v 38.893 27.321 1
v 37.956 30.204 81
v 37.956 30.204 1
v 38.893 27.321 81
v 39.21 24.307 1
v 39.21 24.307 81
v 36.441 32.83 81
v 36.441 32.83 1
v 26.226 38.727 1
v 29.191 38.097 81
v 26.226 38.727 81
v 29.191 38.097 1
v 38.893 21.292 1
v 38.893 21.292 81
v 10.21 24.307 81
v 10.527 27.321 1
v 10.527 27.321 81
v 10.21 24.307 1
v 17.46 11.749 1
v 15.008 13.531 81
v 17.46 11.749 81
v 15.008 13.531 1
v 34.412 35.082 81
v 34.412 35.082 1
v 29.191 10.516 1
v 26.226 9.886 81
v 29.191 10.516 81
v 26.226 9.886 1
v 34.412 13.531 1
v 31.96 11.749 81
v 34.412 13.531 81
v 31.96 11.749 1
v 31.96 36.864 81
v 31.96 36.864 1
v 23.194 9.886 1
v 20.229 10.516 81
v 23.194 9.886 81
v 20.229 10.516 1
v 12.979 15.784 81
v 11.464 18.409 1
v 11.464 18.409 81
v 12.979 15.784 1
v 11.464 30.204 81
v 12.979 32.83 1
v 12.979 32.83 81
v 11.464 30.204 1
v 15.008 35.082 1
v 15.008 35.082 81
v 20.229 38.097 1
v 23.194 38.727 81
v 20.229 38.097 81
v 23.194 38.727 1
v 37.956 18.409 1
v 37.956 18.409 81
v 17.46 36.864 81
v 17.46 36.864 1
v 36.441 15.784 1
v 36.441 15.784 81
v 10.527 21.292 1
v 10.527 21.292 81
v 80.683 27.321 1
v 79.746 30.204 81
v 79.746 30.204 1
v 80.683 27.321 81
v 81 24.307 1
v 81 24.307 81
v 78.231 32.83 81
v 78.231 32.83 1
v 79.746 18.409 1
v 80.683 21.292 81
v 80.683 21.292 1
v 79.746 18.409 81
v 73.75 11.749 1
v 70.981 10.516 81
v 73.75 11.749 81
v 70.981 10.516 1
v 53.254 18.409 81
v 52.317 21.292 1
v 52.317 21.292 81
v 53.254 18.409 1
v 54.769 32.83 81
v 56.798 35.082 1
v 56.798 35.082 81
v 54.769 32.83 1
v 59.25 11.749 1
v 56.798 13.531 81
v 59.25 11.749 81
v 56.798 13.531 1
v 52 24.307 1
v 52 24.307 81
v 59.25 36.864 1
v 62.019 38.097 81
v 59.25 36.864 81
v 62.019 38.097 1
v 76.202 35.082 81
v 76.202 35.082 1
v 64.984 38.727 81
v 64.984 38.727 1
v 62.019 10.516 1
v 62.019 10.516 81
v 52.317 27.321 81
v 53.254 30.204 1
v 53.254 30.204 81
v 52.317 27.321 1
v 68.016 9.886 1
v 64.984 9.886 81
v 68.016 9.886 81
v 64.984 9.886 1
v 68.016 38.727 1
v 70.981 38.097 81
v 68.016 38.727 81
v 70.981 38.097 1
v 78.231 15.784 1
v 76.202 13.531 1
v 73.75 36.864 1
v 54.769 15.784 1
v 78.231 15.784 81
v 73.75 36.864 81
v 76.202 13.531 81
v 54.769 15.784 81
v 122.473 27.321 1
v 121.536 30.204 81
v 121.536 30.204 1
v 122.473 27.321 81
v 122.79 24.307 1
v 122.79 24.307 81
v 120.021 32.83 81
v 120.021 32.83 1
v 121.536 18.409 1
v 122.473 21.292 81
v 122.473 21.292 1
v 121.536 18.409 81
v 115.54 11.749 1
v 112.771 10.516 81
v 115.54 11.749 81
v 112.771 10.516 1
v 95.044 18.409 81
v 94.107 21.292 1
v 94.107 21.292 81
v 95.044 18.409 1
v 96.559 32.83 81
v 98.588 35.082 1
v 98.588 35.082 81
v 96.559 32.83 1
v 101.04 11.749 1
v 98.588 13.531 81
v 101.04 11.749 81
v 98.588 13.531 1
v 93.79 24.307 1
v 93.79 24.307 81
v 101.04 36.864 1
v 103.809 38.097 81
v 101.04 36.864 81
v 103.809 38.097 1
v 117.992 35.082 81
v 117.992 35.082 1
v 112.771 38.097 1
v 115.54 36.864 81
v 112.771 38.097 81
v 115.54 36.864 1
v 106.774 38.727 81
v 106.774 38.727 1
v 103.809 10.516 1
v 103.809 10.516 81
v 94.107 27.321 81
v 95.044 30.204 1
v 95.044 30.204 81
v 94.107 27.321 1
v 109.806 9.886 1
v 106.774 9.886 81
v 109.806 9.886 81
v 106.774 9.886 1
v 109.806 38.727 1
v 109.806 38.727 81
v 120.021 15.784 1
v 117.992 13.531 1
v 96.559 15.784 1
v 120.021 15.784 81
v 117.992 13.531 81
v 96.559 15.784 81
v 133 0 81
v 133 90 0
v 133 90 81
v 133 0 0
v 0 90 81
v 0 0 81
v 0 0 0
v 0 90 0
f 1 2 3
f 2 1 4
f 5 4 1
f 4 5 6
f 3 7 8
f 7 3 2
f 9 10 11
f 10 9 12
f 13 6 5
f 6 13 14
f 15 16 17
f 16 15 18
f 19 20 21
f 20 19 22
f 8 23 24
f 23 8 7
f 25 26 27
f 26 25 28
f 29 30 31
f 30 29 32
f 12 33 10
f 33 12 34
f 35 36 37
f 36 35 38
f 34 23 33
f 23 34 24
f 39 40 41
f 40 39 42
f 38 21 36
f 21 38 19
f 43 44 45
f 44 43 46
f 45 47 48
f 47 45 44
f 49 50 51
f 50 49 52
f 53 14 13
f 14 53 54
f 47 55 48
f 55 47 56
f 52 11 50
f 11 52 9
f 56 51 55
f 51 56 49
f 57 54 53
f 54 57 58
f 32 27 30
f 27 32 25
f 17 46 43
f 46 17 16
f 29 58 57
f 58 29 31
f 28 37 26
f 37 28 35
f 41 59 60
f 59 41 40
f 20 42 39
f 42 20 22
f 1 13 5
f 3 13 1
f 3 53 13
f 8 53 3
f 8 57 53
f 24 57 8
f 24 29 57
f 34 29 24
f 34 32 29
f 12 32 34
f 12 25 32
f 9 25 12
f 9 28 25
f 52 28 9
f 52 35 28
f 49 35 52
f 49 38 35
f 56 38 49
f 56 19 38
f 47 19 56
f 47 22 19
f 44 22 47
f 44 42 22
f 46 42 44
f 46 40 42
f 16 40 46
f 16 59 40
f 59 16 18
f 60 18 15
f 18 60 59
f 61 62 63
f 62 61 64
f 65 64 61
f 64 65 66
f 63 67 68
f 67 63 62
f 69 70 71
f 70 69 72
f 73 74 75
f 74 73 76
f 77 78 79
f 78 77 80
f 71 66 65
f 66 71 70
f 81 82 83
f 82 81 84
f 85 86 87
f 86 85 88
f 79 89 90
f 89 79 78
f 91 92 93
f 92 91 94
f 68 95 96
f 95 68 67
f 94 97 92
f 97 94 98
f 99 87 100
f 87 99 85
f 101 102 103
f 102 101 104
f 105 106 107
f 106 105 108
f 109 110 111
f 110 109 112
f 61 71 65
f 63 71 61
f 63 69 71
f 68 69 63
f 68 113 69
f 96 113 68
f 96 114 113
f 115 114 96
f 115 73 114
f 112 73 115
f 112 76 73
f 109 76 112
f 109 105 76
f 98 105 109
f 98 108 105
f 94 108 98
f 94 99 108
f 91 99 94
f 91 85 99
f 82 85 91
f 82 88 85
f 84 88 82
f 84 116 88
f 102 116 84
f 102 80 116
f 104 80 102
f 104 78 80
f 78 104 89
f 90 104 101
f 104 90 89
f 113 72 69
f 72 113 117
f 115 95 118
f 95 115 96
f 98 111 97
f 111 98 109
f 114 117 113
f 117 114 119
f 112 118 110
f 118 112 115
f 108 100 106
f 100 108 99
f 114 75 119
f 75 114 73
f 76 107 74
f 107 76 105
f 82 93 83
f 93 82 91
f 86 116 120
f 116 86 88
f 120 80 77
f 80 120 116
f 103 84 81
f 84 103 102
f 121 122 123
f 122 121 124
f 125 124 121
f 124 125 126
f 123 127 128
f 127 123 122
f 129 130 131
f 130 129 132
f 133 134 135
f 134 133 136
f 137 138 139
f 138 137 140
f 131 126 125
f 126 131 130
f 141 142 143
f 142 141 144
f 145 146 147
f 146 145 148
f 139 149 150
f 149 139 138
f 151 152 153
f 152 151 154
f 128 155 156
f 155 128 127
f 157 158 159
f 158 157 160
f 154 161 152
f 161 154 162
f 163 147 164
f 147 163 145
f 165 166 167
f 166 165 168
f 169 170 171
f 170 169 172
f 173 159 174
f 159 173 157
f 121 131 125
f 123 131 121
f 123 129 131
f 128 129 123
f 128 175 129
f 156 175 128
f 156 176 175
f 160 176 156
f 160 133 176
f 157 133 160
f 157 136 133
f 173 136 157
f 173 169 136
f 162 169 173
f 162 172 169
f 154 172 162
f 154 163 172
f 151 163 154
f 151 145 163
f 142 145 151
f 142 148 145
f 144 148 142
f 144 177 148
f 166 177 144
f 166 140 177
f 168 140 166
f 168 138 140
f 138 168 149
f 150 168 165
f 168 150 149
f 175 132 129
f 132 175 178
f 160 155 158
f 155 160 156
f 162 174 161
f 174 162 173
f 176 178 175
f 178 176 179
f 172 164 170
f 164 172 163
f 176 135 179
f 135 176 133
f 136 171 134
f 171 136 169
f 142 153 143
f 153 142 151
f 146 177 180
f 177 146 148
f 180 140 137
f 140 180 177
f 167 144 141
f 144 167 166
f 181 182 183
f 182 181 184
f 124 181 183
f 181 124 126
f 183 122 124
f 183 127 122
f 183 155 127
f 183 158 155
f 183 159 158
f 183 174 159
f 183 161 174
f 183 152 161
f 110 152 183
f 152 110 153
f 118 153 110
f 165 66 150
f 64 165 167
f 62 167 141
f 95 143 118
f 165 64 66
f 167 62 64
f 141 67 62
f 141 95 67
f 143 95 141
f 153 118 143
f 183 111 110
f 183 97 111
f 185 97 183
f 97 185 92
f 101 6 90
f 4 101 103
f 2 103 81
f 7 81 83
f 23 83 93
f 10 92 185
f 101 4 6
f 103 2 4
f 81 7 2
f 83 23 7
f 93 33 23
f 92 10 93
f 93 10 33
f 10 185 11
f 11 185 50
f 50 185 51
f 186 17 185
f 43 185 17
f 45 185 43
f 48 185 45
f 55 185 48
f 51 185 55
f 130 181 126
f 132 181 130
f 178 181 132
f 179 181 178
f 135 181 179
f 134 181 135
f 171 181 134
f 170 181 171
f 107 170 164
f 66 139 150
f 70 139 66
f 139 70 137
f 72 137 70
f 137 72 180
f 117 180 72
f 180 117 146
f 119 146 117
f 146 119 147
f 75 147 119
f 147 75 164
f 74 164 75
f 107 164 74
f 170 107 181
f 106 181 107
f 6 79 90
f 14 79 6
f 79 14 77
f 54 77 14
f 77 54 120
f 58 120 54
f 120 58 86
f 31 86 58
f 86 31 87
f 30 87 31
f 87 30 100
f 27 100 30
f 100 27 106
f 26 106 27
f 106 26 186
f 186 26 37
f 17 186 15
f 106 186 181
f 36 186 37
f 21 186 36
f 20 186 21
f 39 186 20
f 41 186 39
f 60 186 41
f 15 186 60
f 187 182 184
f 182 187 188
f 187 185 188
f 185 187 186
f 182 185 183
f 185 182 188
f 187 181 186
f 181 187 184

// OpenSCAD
//Shape of Tube
_shape = 1; //[1:Cylinder,2:Square,3:Pentagon,4:Hexagon,5:Heptagon,6:Octagon]

/*
//Type of Tube
tube_type = 1; //[1:50mL Falcon, 2:15mL Corning, 3:5mL Culture Tube, 4:Other]
*/

// Tube Diameter, 
_diameter = 29;

// Cap Diameter,
cap_diameter = 34.16; 

// Thickness of the base under the tubes
_base = 1;

// Height of rack, plus thickness of base
_height = 80 + _base;

// Length of rack
_length = 133;

// Width of rack
_width = 90;

// Number of tube across
_columns = 3;

// Number of tubes deep
_rows = 2;






module tube(shape, diameter, height)
{
	if(shape == 1)
	{
		cylinder(height, diameter/2, diameter/2);
	}
	if(shape == 2)
	{
		cube([diameter,diameter,height]);
	}
	if(shape == 3)
	{
		linear_extrude(height) circle(diameter/2,$fn=5);
	}
	if(shape == 4)
	{
		linear_extrude(height) circle(diameter/2,$fn=6);
	}
	if(shape == 5)
	{
		linear_extrude(height) circle(diameter/2,$fn=7);
	}
	if(shape == 6)
	{
		linear_extrude(height) circle(diameter/2,$fn=8);
	}
}

module tubeColumn(shape, diameter, height, columns, length, capDiameter)
{
	spacing = (length - (capDiameter*columns)) / (columns + 1);
	for ( x = [spacing + capDiameter/2 : capDiameter + spacing : spacing*columns + capDiameter*(columns - 1) + capDiameter/2])
	{
		translate([x,0,0])tube(shape, diameter, height);
	}
}

module tubeArray(shape, diameter, height, rows, width, columns, length, capDiameter)
{
	spacing = (width - (capDiameter*rows)) / (rows + 1);
	for ( y = [spacing + capDiameter/2 : capDiameter + spacing : spacing*rows + capDiameter*(rows - 1) + capDiameter/2])
	{
		translate([0,y,0])tubeColumn(shape, diameter, height, columns, length, capDiameter);
	}
}

module base(height, length, width)
{
	cube([length, width, height]);
}


difference() 
{
	base(_height,_length,_width);
	translate([0,0,_base])tubeArray(_shape,_diameter,_height,_rows,_width,_columns,_length,cap_diameter);
}
